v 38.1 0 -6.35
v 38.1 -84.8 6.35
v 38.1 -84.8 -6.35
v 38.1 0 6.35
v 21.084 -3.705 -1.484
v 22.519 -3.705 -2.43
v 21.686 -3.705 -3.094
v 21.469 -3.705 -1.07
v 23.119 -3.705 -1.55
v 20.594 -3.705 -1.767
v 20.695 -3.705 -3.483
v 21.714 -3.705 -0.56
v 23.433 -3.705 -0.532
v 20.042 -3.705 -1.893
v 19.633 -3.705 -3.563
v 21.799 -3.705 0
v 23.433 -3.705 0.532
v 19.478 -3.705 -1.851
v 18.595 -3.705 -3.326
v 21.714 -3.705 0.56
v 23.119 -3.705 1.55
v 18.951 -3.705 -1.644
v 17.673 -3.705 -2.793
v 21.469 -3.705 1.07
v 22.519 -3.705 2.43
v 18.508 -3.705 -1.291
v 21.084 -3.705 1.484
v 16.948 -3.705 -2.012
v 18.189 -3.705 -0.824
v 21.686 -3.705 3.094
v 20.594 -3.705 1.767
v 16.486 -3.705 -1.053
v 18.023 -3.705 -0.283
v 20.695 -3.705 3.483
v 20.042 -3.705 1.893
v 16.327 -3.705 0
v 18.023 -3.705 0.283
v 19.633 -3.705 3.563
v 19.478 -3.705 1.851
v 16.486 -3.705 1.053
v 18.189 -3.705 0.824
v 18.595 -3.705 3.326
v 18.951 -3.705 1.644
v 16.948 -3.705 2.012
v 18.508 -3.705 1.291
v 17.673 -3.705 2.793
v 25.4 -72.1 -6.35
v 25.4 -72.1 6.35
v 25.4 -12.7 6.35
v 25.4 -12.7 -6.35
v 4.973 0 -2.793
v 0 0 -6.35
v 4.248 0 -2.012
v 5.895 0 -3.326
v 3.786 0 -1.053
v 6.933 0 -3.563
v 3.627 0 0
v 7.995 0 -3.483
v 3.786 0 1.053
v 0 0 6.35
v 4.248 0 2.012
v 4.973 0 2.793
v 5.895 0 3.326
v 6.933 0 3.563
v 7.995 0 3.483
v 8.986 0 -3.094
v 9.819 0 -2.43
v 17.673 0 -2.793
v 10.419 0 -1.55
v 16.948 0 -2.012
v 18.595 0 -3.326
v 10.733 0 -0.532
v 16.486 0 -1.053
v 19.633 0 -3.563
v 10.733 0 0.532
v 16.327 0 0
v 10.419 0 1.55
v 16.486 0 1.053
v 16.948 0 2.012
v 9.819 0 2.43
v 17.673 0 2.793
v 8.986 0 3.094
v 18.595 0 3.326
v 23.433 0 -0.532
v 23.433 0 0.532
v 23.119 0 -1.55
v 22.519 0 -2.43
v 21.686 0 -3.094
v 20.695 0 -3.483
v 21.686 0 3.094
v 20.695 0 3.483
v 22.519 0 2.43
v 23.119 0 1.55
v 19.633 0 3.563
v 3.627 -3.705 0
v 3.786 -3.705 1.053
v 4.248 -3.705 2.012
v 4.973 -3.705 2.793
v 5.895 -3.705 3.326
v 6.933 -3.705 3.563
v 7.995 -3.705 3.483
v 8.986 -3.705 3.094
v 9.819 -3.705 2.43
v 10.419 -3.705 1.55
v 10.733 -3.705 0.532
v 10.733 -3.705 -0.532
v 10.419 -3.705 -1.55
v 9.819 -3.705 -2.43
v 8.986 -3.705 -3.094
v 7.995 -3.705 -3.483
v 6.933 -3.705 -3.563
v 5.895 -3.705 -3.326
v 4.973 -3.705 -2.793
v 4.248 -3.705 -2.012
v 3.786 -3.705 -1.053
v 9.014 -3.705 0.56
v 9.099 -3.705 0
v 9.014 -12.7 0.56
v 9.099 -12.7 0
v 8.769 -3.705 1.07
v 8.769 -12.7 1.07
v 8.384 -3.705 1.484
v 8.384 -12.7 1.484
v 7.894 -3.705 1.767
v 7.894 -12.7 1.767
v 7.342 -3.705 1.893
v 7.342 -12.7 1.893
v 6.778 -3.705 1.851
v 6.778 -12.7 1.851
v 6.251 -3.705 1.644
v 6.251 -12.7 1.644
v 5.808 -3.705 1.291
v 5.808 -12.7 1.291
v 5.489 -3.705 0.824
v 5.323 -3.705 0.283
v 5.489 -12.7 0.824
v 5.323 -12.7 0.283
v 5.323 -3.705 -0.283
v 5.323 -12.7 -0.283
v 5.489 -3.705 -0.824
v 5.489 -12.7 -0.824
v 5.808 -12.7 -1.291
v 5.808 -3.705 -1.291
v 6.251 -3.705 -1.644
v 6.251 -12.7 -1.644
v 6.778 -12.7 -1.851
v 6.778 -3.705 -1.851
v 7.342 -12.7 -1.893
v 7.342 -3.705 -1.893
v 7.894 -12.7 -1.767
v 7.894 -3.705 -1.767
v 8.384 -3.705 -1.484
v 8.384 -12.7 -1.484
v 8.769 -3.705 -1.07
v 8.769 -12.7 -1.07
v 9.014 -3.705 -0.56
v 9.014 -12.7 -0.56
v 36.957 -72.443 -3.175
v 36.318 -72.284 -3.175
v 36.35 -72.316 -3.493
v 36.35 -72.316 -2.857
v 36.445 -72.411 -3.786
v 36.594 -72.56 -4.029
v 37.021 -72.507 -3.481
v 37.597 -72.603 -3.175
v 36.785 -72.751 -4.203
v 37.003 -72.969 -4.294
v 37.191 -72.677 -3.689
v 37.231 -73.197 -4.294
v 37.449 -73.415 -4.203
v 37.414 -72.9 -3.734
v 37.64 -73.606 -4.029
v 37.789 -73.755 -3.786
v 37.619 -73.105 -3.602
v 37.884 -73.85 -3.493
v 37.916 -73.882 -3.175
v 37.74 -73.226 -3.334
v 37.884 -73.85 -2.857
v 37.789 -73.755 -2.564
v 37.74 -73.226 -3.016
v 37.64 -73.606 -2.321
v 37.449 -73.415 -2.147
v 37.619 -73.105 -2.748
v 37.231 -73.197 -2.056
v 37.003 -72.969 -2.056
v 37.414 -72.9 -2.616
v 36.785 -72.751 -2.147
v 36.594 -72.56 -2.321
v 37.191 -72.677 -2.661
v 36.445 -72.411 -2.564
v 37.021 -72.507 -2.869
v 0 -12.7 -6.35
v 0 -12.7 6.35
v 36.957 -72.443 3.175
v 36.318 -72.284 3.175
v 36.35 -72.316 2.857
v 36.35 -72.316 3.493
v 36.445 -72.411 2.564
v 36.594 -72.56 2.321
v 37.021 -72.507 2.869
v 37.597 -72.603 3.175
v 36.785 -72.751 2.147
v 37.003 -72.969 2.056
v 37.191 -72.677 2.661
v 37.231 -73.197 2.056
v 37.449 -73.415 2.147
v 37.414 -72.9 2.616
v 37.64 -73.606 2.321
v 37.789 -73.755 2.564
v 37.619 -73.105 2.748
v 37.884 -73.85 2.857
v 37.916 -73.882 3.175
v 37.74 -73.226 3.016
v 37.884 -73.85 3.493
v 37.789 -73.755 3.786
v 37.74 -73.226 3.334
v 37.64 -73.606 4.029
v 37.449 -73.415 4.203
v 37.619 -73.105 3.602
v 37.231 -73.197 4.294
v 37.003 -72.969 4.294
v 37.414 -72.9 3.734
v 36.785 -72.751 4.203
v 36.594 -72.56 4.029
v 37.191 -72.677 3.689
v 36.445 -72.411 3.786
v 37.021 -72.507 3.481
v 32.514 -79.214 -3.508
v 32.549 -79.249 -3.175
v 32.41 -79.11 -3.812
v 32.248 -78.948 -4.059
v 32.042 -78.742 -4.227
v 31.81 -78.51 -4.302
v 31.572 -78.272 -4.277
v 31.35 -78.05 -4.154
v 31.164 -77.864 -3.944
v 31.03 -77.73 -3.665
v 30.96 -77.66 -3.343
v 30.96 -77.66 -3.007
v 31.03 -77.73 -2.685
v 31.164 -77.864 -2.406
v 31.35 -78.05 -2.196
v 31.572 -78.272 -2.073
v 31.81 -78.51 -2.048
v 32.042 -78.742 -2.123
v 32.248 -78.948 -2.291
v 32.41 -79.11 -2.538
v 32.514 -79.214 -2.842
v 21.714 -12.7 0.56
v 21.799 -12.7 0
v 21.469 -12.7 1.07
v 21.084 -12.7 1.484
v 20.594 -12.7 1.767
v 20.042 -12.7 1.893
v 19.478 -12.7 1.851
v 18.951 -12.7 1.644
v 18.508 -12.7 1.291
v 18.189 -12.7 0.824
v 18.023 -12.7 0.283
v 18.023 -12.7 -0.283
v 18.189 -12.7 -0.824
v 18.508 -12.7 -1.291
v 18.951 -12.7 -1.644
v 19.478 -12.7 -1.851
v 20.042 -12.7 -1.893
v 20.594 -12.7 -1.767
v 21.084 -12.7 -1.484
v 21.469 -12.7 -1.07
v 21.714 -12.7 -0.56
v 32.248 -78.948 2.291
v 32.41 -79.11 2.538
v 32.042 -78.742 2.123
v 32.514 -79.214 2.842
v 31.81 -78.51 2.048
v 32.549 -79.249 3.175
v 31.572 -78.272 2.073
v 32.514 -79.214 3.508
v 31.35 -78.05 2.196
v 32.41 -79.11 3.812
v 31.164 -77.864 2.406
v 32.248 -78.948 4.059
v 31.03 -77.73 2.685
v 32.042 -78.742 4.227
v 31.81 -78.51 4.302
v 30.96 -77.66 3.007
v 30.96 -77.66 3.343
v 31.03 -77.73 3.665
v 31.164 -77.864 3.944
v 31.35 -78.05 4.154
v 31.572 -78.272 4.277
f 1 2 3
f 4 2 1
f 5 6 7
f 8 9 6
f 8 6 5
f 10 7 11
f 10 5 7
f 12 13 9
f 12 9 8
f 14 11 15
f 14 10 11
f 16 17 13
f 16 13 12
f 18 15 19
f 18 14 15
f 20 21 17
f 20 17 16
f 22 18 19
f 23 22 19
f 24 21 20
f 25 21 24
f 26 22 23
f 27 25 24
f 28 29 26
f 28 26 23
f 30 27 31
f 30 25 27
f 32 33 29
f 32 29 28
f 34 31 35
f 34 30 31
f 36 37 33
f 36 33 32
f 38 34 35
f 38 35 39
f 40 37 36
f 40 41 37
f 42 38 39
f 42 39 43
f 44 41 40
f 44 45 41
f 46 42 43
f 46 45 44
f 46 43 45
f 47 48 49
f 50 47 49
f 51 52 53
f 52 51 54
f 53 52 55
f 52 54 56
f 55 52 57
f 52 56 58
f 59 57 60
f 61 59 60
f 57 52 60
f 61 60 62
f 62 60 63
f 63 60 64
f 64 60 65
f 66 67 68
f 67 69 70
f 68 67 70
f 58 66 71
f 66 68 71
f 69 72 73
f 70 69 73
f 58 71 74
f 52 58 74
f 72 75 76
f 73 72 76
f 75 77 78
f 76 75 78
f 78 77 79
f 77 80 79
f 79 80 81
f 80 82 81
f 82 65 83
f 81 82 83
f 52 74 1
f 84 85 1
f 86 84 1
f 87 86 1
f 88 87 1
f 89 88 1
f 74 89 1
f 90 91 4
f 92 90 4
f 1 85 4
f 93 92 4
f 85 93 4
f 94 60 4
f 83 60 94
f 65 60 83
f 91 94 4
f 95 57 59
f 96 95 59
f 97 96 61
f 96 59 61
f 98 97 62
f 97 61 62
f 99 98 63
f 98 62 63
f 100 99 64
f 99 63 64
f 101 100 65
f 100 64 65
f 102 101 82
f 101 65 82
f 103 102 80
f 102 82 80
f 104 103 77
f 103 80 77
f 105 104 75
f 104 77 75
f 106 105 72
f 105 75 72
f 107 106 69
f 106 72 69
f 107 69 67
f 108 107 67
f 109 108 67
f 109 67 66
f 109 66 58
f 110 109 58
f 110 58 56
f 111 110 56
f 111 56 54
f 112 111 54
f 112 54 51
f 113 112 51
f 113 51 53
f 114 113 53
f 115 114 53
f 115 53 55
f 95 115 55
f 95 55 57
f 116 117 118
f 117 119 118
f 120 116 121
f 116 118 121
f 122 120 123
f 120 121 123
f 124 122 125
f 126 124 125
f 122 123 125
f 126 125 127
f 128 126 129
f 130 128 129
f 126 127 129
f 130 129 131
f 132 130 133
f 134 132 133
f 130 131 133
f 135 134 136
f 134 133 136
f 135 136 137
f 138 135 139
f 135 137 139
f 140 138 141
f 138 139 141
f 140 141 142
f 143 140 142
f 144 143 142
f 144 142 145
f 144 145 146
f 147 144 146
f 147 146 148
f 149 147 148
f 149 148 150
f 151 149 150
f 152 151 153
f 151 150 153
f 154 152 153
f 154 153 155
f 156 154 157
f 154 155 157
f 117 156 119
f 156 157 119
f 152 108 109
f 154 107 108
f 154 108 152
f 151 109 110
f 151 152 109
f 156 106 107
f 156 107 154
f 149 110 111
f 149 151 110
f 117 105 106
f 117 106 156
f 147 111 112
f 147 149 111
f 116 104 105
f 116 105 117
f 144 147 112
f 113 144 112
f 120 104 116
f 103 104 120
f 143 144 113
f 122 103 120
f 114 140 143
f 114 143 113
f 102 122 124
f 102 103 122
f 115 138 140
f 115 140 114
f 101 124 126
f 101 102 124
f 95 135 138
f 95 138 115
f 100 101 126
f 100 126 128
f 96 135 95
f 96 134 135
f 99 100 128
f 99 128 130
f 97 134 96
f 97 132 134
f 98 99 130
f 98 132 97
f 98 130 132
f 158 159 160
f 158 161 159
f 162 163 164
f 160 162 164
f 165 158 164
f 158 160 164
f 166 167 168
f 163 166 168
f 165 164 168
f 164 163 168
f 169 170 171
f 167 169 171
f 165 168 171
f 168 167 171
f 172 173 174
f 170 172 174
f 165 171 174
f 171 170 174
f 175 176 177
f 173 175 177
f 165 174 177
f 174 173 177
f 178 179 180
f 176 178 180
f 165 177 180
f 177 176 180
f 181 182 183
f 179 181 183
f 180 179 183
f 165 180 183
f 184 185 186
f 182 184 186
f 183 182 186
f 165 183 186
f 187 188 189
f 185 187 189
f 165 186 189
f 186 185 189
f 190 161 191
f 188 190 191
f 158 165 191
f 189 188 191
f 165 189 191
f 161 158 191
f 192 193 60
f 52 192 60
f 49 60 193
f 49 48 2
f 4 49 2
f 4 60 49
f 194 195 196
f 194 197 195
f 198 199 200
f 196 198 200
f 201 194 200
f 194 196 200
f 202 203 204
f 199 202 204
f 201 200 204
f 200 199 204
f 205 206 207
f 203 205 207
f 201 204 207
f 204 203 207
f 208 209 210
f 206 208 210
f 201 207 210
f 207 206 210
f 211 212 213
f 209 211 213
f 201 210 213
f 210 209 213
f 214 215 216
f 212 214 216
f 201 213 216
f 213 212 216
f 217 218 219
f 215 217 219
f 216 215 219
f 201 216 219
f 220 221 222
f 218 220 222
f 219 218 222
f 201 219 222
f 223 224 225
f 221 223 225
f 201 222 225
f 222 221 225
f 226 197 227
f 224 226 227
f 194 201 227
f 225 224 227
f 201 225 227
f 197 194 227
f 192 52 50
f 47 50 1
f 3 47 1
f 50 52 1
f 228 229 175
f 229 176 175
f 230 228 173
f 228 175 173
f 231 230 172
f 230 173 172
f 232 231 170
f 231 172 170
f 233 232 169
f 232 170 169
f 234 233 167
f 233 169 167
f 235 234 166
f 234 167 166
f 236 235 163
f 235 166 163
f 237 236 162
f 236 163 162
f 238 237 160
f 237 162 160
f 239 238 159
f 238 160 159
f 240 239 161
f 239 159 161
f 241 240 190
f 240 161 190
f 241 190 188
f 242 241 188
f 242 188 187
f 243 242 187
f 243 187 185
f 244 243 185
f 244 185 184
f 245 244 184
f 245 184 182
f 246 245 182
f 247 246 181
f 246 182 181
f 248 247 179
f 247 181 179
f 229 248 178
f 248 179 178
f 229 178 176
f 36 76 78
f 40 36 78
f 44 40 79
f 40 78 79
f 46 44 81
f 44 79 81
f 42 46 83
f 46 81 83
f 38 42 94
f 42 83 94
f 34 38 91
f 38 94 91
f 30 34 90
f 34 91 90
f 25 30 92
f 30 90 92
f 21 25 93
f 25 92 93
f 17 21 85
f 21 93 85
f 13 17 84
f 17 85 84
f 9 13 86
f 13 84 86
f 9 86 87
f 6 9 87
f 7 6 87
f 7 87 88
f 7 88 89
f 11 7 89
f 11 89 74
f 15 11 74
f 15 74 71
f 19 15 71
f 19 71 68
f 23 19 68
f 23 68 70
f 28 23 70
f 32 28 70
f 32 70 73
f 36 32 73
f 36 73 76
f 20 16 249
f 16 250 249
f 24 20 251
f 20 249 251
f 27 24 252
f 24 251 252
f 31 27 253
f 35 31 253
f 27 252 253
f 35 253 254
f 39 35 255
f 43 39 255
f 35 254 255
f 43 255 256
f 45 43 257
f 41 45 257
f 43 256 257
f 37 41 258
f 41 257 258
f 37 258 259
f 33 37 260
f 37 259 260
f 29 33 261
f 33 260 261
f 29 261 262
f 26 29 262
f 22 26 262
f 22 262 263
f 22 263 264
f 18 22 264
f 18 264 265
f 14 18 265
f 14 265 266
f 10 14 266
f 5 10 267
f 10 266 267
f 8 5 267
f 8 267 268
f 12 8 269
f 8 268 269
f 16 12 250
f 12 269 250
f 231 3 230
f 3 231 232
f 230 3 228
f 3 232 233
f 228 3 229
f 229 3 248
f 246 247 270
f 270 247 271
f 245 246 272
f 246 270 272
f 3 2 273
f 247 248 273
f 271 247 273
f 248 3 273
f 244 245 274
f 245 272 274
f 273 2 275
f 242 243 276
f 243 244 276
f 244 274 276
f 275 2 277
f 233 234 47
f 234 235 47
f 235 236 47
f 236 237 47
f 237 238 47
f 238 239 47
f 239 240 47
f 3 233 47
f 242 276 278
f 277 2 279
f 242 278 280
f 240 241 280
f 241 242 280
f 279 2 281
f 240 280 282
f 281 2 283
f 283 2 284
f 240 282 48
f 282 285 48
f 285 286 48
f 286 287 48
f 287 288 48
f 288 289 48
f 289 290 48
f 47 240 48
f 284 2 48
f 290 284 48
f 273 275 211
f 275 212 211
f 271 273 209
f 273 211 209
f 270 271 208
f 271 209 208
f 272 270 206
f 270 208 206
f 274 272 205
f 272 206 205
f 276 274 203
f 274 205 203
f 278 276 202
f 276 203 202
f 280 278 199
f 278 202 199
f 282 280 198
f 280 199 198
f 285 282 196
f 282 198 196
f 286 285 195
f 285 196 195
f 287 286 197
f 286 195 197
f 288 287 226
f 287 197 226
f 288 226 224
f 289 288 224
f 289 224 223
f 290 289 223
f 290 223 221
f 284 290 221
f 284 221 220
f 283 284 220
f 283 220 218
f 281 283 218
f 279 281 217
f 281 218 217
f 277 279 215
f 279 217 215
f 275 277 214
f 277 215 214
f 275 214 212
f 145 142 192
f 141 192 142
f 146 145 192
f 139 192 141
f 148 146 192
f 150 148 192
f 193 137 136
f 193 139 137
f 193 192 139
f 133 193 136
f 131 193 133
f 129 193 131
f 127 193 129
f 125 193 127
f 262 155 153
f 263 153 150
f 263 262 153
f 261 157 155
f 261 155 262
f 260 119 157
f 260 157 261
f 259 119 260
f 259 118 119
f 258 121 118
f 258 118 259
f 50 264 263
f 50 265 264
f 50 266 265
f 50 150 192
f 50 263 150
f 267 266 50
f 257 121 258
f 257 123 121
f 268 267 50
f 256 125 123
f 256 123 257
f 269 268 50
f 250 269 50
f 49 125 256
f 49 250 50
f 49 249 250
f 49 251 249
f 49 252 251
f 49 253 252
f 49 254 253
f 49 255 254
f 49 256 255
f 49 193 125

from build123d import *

# Parameters (mm, degrees)
SKETCH1_W                                      = 38.1
SKETCH1_H                                      = 84.8
BOSS_EXTRUDE1_DEPTH                            = 6.35
SKETCH2_W                                      = 25.4
SKETCH2_H                                      = 72.1
CUT_EXTRUDE1_DEPTH                             = 13.7
CBORE_FOR_6_SOCKET_HEAD_CAP_SCREW1_D           = 3.7973
CBORE_FOR_6_SOCKET_HEAD_CAP_SCREW1_CBORE_D     = 7.14502
CBORE_FOR_6_SOCKET_HEAD_CAP_SCREW1_CBORE_DEPTH = 3.7051996
CUT_EXTRUDE2_DEPTH                             = 13.7
F_4_40_TAPPED_HOLE2_D                          = 2.2606
F_4_40_TAPPED_HOLE2_DEPTH                      = 7.59
F_4_40_TAPPED_HOLE2_TIP                        = 0.679152758


with BuildPart() as part:
    # Sketch1 → Boss-Extrude1 (new body, symmetric)
    with BuildSketch(Plane.XY):
        with Locations((19.05, -42.4)):
            Rectangle(SKETCH1_W, SKETCH1_H)
    extrude(amount=BOSS_EXTRUDE1_DEPTH, both=True)

    # Sketch2 → Cut-Extrude1 (cut, through all)
    with BuildSketch(Plane.XY.offset(6.35)):
        with Locations((12.7, -48.75)):
            Rectangle(SKETCH2_W, SKETCH2_H)
    extrude(amount=-CUT_EXTRUDE1_DEPTH, mode=Mode.SUBTRACT)

    # CBORE for #6 Socket Head Cap Screw1 (through all)
    with Locations(Plane(origin=(0, 0, 0), x_dir=(-1, 0, 0), z_dir=(0, 1, 0))):
        with Locations((-7.2, 0), (-19.9, 0)):
            CounterBoreHole(CBORE_FOR_6_SOCKET_HEAD_CAP_SCREW1_D / 2, CBORE_FOR_6_SOCKET_HEAD_CAP_SCREW1_CBORE_D / 2, CBORE_FOR_6_SOCKET_HEAD_CAP_SCREW1_CBORE_DEPTH)

    # Sketch9 → Cut-Extrude2 (cut, through all)
    with BuildSketch(Plane.XY.offset(6.35)):
        Polygon((38.1, -84.8), (24.4, -71.1), (24.4, -85.8), (38.1, -85.8), align=None)
    extrude(amount=-CUT_EXTRUDE2_DEPTH, mode=Mode.SUBTRACT)

    # #4-40 Tapped Hole2
    with Locations(Plane(origin=(-23.35, -23.35, 0), x_dir=(-0.707106781, 0.707106781, 0), z_dir=(-0.707106781, -0.707106781, 0))):
        with Locations((-77.923167287, 3.175), (-77.923167287, -3.175)):
            Hole(F_4_40_TAPPED_HOLE2_D / 2, depth=F_4_40_TAPPED_HOLE2_DEPTH)
            with Locations((0, 0, -(F_4_40_TAPPED_HOLE2_DEPTH + F_4_40_TAPPED_HOLE2_TIP / 2))):  # 118° drill point
                Cone(0, F_4_40_TAPPED_HOLE2_D / 2, F_4_40_TAPPED_HOLE2_TIP, mode=Mode.SUBTRACT)


solid = part.part
